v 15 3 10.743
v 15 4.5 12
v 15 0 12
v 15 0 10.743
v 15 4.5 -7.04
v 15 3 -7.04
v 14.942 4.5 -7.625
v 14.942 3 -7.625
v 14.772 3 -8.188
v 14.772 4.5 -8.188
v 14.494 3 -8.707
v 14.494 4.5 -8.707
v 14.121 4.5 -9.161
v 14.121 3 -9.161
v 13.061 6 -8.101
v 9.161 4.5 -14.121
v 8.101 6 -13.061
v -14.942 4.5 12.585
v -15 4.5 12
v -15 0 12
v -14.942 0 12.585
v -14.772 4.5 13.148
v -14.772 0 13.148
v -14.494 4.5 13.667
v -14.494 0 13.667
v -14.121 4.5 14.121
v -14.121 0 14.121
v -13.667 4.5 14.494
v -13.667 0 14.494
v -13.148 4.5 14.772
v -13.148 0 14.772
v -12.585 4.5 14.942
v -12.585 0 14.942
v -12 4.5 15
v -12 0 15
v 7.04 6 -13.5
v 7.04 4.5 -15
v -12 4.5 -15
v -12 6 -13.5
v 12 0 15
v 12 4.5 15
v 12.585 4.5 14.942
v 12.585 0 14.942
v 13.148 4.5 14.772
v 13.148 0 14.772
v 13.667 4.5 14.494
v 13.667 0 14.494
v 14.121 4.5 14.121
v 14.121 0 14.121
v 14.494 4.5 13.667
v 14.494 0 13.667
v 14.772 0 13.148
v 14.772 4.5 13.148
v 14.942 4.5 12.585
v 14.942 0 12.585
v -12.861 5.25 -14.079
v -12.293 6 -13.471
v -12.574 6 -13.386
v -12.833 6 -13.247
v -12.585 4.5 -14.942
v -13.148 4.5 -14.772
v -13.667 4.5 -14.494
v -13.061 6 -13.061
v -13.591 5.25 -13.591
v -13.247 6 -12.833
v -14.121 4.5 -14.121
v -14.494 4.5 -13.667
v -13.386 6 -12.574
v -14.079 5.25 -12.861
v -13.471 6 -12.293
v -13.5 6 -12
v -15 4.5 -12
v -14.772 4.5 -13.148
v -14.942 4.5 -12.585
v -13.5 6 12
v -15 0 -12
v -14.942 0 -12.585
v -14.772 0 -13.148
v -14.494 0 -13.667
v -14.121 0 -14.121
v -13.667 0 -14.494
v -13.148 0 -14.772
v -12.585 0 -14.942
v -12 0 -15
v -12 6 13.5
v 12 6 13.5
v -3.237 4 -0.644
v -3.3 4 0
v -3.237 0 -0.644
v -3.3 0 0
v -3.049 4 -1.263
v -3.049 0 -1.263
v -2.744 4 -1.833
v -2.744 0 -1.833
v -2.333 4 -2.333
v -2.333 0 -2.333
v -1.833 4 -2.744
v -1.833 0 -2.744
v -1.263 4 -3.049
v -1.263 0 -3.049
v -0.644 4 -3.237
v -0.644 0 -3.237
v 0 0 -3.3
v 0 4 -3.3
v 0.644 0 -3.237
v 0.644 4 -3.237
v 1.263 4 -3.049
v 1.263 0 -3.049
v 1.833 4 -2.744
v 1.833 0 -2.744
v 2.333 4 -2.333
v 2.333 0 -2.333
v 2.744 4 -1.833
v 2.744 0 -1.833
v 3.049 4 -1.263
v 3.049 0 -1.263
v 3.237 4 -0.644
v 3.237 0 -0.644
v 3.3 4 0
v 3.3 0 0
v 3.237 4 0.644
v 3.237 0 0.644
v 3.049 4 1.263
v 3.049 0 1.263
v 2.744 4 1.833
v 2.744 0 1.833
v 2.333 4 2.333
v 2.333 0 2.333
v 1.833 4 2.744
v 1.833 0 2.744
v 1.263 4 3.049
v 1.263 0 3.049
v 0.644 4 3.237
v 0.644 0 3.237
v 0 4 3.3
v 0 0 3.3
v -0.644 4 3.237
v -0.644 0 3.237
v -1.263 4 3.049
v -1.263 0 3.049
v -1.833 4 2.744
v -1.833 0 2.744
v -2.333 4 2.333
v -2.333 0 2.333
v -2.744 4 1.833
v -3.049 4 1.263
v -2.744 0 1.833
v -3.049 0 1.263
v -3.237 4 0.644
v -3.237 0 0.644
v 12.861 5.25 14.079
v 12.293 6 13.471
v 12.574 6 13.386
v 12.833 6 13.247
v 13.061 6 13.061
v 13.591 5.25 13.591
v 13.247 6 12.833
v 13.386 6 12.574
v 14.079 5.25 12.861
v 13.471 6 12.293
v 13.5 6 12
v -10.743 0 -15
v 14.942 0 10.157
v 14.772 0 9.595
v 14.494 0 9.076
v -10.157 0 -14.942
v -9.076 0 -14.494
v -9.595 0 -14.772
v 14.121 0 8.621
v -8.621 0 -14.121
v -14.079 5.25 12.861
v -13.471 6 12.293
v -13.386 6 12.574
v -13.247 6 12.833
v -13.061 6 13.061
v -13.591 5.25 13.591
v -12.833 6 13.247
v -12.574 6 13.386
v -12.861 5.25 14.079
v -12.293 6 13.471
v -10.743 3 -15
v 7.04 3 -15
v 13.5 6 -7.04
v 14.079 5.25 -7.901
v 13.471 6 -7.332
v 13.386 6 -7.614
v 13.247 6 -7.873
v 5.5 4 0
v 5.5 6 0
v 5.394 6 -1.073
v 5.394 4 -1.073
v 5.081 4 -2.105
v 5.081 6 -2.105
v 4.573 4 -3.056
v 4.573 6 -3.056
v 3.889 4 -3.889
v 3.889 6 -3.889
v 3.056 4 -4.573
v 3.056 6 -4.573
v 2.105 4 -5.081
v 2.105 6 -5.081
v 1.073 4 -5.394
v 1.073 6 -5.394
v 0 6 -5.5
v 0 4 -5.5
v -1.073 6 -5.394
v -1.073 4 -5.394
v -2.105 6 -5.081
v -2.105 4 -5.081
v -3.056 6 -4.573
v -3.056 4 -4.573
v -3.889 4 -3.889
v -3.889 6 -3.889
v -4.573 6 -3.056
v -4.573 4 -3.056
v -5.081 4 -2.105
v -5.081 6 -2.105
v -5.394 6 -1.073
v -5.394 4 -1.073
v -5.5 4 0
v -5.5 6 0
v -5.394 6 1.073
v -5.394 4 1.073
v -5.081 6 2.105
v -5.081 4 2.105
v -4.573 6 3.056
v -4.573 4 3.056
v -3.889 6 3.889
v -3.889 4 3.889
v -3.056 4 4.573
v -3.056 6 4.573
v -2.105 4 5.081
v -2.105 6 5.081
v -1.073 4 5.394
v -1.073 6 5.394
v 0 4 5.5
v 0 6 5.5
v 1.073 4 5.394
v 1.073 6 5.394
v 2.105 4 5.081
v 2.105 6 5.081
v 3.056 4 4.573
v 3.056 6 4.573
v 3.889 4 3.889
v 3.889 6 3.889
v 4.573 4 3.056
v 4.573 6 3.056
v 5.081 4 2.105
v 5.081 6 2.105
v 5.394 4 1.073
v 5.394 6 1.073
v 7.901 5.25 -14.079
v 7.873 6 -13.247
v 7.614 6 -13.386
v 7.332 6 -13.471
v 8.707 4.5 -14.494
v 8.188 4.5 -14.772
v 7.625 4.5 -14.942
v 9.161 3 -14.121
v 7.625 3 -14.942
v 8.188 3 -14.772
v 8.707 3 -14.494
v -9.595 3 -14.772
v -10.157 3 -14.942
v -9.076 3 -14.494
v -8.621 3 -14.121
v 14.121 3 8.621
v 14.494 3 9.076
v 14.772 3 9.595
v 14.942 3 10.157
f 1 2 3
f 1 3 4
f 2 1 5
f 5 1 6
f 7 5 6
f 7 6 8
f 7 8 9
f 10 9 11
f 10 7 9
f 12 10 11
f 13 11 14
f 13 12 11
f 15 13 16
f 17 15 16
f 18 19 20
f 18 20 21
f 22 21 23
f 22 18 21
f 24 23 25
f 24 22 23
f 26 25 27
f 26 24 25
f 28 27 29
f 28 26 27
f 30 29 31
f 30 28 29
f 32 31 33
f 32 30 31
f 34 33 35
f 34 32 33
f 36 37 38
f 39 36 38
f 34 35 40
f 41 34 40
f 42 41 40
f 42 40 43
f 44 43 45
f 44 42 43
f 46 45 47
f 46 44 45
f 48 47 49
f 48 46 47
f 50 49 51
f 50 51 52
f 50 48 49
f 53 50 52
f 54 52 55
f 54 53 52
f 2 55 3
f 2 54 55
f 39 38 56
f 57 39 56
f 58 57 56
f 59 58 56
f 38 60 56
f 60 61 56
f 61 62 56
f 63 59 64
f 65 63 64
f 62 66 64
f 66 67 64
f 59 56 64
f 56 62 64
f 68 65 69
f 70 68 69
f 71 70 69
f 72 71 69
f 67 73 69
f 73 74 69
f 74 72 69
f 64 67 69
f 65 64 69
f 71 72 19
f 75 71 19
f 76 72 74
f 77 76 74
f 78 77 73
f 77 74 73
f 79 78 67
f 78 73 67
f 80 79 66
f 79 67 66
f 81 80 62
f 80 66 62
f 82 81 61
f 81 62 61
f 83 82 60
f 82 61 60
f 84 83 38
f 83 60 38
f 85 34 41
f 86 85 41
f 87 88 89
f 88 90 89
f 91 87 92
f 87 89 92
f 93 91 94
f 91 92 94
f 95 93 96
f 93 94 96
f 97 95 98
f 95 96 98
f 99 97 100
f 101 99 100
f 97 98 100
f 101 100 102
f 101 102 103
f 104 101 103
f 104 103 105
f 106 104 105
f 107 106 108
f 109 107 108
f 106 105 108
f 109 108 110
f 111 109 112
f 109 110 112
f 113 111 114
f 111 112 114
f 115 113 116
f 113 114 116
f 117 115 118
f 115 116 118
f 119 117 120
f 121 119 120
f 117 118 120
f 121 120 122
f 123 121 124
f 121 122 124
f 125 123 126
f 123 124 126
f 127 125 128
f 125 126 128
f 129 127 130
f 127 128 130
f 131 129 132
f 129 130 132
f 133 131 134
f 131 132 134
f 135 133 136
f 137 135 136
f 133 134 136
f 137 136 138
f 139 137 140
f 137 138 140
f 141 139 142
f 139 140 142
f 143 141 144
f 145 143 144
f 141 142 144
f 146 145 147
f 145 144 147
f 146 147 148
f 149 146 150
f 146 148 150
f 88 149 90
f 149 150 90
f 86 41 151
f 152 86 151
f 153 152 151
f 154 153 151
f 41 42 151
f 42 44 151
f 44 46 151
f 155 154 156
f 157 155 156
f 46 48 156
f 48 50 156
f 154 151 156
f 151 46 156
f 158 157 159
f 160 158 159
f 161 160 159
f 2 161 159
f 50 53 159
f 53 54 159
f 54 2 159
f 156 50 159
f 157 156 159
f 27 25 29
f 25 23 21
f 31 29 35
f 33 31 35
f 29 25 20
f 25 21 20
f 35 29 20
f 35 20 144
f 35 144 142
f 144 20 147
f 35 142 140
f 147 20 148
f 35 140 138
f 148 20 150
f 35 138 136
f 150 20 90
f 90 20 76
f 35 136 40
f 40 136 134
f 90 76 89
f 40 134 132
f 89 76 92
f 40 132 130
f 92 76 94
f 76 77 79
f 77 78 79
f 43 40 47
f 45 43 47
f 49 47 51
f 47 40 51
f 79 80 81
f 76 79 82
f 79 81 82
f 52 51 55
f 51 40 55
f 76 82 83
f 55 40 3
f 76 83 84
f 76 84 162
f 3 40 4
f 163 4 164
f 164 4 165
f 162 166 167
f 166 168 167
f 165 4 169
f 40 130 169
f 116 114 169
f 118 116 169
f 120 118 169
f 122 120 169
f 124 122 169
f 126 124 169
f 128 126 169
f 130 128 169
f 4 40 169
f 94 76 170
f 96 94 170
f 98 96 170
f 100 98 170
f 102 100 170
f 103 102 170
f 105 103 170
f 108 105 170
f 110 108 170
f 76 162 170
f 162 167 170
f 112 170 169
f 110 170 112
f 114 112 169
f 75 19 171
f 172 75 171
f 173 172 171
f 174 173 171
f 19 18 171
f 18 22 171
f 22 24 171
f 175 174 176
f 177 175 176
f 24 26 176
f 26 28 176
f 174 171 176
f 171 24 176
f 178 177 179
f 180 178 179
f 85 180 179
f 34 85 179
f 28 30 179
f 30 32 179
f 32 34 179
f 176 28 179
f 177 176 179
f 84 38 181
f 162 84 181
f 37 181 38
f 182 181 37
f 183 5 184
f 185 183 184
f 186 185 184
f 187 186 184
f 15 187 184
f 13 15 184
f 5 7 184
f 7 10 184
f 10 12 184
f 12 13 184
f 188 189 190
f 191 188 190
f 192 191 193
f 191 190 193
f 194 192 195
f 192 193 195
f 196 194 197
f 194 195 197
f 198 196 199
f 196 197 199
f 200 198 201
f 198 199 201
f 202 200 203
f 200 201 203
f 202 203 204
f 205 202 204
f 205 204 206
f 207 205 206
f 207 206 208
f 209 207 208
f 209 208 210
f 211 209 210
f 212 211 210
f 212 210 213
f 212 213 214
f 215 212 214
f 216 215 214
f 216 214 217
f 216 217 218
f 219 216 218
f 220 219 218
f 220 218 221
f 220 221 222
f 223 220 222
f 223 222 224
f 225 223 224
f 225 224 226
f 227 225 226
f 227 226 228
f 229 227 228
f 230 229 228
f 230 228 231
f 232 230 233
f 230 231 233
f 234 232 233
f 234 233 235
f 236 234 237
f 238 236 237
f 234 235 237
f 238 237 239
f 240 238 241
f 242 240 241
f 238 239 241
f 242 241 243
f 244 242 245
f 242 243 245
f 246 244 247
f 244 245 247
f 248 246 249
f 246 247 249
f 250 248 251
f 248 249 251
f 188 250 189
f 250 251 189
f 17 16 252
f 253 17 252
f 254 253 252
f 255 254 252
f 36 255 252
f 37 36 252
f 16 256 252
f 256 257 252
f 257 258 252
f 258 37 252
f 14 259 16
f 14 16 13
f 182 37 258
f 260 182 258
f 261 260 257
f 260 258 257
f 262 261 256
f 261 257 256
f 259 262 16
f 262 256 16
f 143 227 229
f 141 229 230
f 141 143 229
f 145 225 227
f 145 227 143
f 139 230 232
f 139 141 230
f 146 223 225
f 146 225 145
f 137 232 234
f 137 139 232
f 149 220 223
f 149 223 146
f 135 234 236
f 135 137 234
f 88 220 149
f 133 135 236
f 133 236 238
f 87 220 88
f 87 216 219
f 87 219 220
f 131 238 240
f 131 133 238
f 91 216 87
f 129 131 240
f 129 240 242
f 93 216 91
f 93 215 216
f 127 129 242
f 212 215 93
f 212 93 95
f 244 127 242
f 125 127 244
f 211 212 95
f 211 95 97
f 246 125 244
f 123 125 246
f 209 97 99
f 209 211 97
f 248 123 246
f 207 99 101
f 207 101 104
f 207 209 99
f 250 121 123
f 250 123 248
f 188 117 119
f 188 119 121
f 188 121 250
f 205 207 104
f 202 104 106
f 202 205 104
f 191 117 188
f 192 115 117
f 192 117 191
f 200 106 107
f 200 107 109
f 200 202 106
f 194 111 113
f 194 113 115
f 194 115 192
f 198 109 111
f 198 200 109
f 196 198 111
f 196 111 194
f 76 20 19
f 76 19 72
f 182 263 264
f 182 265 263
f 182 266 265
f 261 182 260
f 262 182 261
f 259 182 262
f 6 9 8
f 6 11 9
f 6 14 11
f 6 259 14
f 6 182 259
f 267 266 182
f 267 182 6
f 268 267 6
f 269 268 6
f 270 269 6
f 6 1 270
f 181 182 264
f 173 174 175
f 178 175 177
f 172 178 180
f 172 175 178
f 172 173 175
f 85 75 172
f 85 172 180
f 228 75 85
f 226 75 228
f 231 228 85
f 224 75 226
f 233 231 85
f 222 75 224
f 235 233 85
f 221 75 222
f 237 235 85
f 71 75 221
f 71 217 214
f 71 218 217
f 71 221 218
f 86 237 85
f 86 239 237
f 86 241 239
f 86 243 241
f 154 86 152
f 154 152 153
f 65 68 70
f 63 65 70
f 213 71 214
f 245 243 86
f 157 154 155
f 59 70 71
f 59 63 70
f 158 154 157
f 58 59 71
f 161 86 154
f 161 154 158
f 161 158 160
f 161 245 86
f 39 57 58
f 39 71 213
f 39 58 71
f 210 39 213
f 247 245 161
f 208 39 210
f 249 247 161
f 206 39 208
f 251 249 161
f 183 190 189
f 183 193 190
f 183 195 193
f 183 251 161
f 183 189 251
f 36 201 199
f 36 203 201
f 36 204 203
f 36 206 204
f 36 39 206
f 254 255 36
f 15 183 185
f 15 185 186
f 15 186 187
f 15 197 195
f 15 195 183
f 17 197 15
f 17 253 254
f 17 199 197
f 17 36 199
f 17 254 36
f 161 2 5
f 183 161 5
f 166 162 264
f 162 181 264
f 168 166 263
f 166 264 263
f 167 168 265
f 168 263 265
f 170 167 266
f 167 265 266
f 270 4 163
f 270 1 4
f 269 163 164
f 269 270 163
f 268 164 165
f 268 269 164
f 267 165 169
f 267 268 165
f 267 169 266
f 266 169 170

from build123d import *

# Parameters (mm, degrees)
SKETCH1_W                                           = 30
SKETCH1_H                                           = 30
BOSS_EXTRUDE1_DEPTH                                 = 6
CUT_EXTRUDE1_DEPTH                                  = 3
CUT_EXTRUDE2_DEPTH                                  = 22.424285286
FILLET1_R                                           = 3
CHAMFER1_SIZE                                       = 1.5
CBORE_FOR_M6_HEX_SOCKET_HEAD_CAP_SCREW1_D           = 6.6
CBORE_FOR_M6_HEX_SOCKET_HEAD_CAP_SCREW1_CBORE_D     = 11
CBORE_FOR_M6_HEX_SOCKET_HEAD_CAP_SCREW1_CBORE_DEPTH = 2


with BuildPart() as part:
    # Sketch1 → Boss-Extrude1 (new body)
    with BuildSketch(Plane(origin=(0, 0, 0), x_dir=(1, 0, 0), z_dir=(0, 1, 0))):
        Rectangle(SKETCH1_W, SKETCH1_H)
    extrude(amount=BOSS_EXTRUDE1_DEPTH)

    # Sketch2 → Cut-Extrude1 (cut)
    with BuildSketch(Plane.XZ):
        Polygon((15, 9.5), (-9.5, -15), (15, -15), align=None)
    extrude(amount=-CUT_EXTRUDE1_DEPTH, mode=Mode.SUBTRACT)

    # Sketch3 → Cut-Extrude2 (cut, through all)
    with BuildSketch(Plane.XZ.offset(-3)):
        Polygon((15, -8.282485579), (15, -15), (8.282485579, -15), align=None)
    extrude(amount=-CUT_EXTRUDE2_DEPTH, mode=Mode.SUBTRACT)

    # Fillet1
    fillet1_edges = [part.edges().sort_by_distance(p)[0] for p in [
        (15, 1.5, 9.5),
        (-9.5, 1.5, -15),
        (8.282485579, 4.5, -15),
        (15, 4.5, -8.282485579),
        (15, 3, 15),
        (-15, 3, 15),
        (-15, 3, -15),
    ]]
    fillet(fillet1_edges, radius=FILLET1_R)

    # Chamfer1
    chamfer1_edges = [part.edges().sort_by_distance(p)[0] for p in [
        (15, 6, 2.480077554),
        (-2.480077554, 6, -15),
        (0, 6, 15),
        (-15, 6, 0),
        (11.641242789, 6, -11.641242789),
        (14.121320344, 6, 14.121320344),
        (14.771638598, 6, -8.187895189),
        (8.187895189, 6, -14.771638598),
        (-14.121320344, 6, -14.121320344),
        (-14.121320344, 6, 14.121320344),
    ]]
    chamfer(chamfer1_edges, length=CHAMFER1_SIZE)

    # CBORE for M6 Hex Socket Head Cap Screw1 (through all)
    with Locations(Plane(origin=(0, 6, 0), x_dir=(1, 0, 0), z_dir=(0, 1, 0))):
        with Locations((0, 0)):
            CounterBoreHole(CBORE_FOR_M6_HEX_SOCKET_HEAD_CAP_SCREW1_D / 2, CBORE_FOR_M6_HEX_SOCKET_HEAD_CAP_SCREW1_CBORE_D / 2, CBORE_FOR_M6_HEX_SOCKET_HEAD_CAP_SCREW1_CBORE_DEPTH)


solid = part.part
